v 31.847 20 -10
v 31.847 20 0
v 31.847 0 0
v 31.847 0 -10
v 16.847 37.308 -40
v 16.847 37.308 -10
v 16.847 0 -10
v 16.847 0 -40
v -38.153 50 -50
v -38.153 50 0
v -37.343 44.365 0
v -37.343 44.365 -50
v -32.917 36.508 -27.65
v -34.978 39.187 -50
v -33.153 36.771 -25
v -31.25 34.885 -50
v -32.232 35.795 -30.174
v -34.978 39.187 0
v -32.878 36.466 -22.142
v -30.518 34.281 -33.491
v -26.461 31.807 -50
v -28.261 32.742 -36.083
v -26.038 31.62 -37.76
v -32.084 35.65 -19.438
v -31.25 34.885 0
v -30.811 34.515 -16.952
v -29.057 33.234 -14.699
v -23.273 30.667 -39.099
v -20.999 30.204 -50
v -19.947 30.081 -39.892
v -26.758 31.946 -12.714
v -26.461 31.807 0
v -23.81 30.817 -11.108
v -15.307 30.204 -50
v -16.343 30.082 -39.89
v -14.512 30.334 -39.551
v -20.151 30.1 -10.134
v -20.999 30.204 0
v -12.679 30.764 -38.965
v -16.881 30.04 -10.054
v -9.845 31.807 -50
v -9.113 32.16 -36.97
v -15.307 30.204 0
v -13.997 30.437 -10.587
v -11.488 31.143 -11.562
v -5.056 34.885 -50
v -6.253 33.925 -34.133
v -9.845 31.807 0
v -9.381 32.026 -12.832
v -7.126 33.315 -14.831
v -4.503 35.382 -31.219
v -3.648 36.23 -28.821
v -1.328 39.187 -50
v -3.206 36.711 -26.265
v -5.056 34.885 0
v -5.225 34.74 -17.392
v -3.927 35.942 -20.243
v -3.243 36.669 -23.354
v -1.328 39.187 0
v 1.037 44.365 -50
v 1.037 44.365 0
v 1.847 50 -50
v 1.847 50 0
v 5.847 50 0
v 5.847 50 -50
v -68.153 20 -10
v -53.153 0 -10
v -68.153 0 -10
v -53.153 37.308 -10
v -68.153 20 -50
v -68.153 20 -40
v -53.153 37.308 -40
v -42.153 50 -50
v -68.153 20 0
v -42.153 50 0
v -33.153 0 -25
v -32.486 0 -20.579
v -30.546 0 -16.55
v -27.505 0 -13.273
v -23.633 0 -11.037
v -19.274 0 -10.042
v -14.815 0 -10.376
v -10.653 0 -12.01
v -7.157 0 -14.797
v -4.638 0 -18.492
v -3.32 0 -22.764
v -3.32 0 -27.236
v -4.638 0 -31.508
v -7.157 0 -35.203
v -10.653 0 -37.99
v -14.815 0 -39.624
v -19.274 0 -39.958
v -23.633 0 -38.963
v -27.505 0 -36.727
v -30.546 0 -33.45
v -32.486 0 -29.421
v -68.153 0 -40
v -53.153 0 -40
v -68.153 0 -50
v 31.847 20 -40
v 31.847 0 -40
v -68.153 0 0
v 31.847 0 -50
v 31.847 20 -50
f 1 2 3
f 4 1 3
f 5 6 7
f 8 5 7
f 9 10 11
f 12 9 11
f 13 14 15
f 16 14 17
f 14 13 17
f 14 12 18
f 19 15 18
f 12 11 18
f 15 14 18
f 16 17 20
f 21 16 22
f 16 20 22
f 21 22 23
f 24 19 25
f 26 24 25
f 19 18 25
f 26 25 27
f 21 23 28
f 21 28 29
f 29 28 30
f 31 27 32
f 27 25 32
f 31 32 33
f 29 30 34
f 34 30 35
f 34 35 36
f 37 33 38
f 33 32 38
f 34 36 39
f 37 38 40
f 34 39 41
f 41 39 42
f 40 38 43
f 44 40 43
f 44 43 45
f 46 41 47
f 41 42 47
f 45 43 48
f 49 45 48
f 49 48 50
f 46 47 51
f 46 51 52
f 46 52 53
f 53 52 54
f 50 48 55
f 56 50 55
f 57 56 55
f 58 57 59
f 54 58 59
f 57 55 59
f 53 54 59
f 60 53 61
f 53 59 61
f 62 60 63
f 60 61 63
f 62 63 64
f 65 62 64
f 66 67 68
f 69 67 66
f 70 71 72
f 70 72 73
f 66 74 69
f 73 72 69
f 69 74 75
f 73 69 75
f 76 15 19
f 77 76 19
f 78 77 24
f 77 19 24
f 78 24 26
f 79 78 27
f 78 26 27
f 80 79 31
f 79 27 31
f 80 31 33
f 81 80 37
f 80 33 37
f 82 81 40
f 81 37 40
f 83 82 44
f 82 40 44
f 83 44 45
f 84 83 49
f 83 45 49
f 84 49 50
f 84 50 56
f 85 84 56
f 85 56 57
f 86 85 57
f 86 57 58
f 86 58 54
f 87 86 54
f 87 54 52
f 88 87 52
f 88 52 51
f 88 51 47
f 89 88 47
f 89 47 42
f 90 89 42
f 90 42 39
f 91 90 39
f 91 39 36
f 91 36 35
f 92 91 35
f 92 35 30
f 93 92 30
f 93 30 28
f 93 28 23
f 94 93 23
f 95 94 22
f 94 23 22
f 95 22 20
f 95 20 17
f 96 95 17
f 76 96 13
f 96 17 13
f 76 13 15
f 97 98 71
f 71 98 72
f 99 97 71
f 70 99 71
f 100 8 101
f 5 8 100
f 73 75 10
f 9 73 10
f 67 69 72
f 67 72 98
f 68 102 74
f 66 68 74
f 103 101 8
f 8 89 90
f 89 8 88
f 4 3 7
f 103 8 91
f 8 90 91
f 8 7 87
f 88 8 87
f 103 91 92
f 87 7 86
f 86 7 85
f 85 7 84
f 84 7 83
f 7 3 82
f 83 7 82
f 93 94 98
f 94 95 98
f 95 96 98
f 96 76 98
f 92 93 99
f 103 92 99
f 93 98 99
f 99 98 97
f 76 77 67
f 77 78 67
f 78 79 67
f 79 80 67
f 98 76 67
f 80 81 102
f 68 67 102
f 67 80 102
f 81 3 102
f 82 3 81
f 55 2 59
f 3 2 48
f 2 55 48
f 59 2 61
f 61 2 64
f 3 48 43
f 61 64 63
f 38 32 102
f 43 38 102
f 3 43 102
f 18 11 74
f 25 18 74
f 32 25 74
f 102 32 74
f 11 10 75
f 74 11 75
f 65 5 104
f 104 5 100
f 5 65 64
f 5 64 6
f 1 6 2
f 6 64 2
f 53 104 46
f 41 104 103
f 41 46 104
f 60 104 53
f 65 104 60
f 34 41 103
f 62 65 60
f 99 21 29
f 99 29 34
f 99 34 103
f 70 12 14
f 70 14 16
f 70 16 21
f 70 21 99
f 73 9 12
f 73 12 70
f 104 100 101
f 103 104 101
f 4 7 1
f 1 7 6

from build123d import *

# Parameters (mm, degrees)
BOSS_EXTRUDE1_DEPTH = 50
SKETCH2_R           = 15
CUT_EXTRUDE1_DEPTH  = 50
CUT_EXTRUDE2_DEPTH  = 30


with BuildPart() as part:
    # Sketch1 → Boss-Extrude1 (new body)
    with BuildSketch(Plane.XY):
        with BuildLine():
            Line((-68.152842986, 0), (-68.152842986, 20))
            Line((-68.152842986, 20), (-42.152842986, 50))
            Line((-42.152842986, 50), (-38.152842986, 50))
            ThreePointArc((-38.152842986, 50), (-18.152842986, 30), (1.847157014, 50))
            Line((1.847157014, 50), (5.847157014, 50))
            Line((5.847157014, 50), (31.847157014, 20))
            Line((31.847157014, 20), (31.847157014, 0))
            Line((31.847157014, 0), (-68.152842986, 0))
        make_face()
    extrude(amount=-BOSS_EXTRUDE1_DEPTH)

    # Sketch2 → Cut-Extrude1 (cut)
    with BuildSketch(Plane(origin=(0, 50, 0), x_dir=(1, 0, 0), z_dir=(0, 1, 0))):
        with Locations(Location((-18.152842986, 25, 0), (0, 0, 180))):
            Circle(SKETCH2_R)
    extrude(amount=-CUT_EXTRUDE1_DEPTH, mode=Mode.SUBTRACT)

    # Sketch3 → Cut-Extrude2 (cut)
    with BuildSketch(Plane.XY.offset(-10)):
        Polygon((31.847157014, 0), (31.847157014, 20), (16.847157014, 37.307692308), (16.847157014, 0), align=None)
        Polygon((-68.152842986, 0), (-68.152842986, 20), (-53.152842986, 37.307692308), (-53.152842986, 0), align=None)
    extrude(amount=-CUT_EXTRUDE2_DEPTH, mode=Mode.SUBTRACT)


solid = part.part
